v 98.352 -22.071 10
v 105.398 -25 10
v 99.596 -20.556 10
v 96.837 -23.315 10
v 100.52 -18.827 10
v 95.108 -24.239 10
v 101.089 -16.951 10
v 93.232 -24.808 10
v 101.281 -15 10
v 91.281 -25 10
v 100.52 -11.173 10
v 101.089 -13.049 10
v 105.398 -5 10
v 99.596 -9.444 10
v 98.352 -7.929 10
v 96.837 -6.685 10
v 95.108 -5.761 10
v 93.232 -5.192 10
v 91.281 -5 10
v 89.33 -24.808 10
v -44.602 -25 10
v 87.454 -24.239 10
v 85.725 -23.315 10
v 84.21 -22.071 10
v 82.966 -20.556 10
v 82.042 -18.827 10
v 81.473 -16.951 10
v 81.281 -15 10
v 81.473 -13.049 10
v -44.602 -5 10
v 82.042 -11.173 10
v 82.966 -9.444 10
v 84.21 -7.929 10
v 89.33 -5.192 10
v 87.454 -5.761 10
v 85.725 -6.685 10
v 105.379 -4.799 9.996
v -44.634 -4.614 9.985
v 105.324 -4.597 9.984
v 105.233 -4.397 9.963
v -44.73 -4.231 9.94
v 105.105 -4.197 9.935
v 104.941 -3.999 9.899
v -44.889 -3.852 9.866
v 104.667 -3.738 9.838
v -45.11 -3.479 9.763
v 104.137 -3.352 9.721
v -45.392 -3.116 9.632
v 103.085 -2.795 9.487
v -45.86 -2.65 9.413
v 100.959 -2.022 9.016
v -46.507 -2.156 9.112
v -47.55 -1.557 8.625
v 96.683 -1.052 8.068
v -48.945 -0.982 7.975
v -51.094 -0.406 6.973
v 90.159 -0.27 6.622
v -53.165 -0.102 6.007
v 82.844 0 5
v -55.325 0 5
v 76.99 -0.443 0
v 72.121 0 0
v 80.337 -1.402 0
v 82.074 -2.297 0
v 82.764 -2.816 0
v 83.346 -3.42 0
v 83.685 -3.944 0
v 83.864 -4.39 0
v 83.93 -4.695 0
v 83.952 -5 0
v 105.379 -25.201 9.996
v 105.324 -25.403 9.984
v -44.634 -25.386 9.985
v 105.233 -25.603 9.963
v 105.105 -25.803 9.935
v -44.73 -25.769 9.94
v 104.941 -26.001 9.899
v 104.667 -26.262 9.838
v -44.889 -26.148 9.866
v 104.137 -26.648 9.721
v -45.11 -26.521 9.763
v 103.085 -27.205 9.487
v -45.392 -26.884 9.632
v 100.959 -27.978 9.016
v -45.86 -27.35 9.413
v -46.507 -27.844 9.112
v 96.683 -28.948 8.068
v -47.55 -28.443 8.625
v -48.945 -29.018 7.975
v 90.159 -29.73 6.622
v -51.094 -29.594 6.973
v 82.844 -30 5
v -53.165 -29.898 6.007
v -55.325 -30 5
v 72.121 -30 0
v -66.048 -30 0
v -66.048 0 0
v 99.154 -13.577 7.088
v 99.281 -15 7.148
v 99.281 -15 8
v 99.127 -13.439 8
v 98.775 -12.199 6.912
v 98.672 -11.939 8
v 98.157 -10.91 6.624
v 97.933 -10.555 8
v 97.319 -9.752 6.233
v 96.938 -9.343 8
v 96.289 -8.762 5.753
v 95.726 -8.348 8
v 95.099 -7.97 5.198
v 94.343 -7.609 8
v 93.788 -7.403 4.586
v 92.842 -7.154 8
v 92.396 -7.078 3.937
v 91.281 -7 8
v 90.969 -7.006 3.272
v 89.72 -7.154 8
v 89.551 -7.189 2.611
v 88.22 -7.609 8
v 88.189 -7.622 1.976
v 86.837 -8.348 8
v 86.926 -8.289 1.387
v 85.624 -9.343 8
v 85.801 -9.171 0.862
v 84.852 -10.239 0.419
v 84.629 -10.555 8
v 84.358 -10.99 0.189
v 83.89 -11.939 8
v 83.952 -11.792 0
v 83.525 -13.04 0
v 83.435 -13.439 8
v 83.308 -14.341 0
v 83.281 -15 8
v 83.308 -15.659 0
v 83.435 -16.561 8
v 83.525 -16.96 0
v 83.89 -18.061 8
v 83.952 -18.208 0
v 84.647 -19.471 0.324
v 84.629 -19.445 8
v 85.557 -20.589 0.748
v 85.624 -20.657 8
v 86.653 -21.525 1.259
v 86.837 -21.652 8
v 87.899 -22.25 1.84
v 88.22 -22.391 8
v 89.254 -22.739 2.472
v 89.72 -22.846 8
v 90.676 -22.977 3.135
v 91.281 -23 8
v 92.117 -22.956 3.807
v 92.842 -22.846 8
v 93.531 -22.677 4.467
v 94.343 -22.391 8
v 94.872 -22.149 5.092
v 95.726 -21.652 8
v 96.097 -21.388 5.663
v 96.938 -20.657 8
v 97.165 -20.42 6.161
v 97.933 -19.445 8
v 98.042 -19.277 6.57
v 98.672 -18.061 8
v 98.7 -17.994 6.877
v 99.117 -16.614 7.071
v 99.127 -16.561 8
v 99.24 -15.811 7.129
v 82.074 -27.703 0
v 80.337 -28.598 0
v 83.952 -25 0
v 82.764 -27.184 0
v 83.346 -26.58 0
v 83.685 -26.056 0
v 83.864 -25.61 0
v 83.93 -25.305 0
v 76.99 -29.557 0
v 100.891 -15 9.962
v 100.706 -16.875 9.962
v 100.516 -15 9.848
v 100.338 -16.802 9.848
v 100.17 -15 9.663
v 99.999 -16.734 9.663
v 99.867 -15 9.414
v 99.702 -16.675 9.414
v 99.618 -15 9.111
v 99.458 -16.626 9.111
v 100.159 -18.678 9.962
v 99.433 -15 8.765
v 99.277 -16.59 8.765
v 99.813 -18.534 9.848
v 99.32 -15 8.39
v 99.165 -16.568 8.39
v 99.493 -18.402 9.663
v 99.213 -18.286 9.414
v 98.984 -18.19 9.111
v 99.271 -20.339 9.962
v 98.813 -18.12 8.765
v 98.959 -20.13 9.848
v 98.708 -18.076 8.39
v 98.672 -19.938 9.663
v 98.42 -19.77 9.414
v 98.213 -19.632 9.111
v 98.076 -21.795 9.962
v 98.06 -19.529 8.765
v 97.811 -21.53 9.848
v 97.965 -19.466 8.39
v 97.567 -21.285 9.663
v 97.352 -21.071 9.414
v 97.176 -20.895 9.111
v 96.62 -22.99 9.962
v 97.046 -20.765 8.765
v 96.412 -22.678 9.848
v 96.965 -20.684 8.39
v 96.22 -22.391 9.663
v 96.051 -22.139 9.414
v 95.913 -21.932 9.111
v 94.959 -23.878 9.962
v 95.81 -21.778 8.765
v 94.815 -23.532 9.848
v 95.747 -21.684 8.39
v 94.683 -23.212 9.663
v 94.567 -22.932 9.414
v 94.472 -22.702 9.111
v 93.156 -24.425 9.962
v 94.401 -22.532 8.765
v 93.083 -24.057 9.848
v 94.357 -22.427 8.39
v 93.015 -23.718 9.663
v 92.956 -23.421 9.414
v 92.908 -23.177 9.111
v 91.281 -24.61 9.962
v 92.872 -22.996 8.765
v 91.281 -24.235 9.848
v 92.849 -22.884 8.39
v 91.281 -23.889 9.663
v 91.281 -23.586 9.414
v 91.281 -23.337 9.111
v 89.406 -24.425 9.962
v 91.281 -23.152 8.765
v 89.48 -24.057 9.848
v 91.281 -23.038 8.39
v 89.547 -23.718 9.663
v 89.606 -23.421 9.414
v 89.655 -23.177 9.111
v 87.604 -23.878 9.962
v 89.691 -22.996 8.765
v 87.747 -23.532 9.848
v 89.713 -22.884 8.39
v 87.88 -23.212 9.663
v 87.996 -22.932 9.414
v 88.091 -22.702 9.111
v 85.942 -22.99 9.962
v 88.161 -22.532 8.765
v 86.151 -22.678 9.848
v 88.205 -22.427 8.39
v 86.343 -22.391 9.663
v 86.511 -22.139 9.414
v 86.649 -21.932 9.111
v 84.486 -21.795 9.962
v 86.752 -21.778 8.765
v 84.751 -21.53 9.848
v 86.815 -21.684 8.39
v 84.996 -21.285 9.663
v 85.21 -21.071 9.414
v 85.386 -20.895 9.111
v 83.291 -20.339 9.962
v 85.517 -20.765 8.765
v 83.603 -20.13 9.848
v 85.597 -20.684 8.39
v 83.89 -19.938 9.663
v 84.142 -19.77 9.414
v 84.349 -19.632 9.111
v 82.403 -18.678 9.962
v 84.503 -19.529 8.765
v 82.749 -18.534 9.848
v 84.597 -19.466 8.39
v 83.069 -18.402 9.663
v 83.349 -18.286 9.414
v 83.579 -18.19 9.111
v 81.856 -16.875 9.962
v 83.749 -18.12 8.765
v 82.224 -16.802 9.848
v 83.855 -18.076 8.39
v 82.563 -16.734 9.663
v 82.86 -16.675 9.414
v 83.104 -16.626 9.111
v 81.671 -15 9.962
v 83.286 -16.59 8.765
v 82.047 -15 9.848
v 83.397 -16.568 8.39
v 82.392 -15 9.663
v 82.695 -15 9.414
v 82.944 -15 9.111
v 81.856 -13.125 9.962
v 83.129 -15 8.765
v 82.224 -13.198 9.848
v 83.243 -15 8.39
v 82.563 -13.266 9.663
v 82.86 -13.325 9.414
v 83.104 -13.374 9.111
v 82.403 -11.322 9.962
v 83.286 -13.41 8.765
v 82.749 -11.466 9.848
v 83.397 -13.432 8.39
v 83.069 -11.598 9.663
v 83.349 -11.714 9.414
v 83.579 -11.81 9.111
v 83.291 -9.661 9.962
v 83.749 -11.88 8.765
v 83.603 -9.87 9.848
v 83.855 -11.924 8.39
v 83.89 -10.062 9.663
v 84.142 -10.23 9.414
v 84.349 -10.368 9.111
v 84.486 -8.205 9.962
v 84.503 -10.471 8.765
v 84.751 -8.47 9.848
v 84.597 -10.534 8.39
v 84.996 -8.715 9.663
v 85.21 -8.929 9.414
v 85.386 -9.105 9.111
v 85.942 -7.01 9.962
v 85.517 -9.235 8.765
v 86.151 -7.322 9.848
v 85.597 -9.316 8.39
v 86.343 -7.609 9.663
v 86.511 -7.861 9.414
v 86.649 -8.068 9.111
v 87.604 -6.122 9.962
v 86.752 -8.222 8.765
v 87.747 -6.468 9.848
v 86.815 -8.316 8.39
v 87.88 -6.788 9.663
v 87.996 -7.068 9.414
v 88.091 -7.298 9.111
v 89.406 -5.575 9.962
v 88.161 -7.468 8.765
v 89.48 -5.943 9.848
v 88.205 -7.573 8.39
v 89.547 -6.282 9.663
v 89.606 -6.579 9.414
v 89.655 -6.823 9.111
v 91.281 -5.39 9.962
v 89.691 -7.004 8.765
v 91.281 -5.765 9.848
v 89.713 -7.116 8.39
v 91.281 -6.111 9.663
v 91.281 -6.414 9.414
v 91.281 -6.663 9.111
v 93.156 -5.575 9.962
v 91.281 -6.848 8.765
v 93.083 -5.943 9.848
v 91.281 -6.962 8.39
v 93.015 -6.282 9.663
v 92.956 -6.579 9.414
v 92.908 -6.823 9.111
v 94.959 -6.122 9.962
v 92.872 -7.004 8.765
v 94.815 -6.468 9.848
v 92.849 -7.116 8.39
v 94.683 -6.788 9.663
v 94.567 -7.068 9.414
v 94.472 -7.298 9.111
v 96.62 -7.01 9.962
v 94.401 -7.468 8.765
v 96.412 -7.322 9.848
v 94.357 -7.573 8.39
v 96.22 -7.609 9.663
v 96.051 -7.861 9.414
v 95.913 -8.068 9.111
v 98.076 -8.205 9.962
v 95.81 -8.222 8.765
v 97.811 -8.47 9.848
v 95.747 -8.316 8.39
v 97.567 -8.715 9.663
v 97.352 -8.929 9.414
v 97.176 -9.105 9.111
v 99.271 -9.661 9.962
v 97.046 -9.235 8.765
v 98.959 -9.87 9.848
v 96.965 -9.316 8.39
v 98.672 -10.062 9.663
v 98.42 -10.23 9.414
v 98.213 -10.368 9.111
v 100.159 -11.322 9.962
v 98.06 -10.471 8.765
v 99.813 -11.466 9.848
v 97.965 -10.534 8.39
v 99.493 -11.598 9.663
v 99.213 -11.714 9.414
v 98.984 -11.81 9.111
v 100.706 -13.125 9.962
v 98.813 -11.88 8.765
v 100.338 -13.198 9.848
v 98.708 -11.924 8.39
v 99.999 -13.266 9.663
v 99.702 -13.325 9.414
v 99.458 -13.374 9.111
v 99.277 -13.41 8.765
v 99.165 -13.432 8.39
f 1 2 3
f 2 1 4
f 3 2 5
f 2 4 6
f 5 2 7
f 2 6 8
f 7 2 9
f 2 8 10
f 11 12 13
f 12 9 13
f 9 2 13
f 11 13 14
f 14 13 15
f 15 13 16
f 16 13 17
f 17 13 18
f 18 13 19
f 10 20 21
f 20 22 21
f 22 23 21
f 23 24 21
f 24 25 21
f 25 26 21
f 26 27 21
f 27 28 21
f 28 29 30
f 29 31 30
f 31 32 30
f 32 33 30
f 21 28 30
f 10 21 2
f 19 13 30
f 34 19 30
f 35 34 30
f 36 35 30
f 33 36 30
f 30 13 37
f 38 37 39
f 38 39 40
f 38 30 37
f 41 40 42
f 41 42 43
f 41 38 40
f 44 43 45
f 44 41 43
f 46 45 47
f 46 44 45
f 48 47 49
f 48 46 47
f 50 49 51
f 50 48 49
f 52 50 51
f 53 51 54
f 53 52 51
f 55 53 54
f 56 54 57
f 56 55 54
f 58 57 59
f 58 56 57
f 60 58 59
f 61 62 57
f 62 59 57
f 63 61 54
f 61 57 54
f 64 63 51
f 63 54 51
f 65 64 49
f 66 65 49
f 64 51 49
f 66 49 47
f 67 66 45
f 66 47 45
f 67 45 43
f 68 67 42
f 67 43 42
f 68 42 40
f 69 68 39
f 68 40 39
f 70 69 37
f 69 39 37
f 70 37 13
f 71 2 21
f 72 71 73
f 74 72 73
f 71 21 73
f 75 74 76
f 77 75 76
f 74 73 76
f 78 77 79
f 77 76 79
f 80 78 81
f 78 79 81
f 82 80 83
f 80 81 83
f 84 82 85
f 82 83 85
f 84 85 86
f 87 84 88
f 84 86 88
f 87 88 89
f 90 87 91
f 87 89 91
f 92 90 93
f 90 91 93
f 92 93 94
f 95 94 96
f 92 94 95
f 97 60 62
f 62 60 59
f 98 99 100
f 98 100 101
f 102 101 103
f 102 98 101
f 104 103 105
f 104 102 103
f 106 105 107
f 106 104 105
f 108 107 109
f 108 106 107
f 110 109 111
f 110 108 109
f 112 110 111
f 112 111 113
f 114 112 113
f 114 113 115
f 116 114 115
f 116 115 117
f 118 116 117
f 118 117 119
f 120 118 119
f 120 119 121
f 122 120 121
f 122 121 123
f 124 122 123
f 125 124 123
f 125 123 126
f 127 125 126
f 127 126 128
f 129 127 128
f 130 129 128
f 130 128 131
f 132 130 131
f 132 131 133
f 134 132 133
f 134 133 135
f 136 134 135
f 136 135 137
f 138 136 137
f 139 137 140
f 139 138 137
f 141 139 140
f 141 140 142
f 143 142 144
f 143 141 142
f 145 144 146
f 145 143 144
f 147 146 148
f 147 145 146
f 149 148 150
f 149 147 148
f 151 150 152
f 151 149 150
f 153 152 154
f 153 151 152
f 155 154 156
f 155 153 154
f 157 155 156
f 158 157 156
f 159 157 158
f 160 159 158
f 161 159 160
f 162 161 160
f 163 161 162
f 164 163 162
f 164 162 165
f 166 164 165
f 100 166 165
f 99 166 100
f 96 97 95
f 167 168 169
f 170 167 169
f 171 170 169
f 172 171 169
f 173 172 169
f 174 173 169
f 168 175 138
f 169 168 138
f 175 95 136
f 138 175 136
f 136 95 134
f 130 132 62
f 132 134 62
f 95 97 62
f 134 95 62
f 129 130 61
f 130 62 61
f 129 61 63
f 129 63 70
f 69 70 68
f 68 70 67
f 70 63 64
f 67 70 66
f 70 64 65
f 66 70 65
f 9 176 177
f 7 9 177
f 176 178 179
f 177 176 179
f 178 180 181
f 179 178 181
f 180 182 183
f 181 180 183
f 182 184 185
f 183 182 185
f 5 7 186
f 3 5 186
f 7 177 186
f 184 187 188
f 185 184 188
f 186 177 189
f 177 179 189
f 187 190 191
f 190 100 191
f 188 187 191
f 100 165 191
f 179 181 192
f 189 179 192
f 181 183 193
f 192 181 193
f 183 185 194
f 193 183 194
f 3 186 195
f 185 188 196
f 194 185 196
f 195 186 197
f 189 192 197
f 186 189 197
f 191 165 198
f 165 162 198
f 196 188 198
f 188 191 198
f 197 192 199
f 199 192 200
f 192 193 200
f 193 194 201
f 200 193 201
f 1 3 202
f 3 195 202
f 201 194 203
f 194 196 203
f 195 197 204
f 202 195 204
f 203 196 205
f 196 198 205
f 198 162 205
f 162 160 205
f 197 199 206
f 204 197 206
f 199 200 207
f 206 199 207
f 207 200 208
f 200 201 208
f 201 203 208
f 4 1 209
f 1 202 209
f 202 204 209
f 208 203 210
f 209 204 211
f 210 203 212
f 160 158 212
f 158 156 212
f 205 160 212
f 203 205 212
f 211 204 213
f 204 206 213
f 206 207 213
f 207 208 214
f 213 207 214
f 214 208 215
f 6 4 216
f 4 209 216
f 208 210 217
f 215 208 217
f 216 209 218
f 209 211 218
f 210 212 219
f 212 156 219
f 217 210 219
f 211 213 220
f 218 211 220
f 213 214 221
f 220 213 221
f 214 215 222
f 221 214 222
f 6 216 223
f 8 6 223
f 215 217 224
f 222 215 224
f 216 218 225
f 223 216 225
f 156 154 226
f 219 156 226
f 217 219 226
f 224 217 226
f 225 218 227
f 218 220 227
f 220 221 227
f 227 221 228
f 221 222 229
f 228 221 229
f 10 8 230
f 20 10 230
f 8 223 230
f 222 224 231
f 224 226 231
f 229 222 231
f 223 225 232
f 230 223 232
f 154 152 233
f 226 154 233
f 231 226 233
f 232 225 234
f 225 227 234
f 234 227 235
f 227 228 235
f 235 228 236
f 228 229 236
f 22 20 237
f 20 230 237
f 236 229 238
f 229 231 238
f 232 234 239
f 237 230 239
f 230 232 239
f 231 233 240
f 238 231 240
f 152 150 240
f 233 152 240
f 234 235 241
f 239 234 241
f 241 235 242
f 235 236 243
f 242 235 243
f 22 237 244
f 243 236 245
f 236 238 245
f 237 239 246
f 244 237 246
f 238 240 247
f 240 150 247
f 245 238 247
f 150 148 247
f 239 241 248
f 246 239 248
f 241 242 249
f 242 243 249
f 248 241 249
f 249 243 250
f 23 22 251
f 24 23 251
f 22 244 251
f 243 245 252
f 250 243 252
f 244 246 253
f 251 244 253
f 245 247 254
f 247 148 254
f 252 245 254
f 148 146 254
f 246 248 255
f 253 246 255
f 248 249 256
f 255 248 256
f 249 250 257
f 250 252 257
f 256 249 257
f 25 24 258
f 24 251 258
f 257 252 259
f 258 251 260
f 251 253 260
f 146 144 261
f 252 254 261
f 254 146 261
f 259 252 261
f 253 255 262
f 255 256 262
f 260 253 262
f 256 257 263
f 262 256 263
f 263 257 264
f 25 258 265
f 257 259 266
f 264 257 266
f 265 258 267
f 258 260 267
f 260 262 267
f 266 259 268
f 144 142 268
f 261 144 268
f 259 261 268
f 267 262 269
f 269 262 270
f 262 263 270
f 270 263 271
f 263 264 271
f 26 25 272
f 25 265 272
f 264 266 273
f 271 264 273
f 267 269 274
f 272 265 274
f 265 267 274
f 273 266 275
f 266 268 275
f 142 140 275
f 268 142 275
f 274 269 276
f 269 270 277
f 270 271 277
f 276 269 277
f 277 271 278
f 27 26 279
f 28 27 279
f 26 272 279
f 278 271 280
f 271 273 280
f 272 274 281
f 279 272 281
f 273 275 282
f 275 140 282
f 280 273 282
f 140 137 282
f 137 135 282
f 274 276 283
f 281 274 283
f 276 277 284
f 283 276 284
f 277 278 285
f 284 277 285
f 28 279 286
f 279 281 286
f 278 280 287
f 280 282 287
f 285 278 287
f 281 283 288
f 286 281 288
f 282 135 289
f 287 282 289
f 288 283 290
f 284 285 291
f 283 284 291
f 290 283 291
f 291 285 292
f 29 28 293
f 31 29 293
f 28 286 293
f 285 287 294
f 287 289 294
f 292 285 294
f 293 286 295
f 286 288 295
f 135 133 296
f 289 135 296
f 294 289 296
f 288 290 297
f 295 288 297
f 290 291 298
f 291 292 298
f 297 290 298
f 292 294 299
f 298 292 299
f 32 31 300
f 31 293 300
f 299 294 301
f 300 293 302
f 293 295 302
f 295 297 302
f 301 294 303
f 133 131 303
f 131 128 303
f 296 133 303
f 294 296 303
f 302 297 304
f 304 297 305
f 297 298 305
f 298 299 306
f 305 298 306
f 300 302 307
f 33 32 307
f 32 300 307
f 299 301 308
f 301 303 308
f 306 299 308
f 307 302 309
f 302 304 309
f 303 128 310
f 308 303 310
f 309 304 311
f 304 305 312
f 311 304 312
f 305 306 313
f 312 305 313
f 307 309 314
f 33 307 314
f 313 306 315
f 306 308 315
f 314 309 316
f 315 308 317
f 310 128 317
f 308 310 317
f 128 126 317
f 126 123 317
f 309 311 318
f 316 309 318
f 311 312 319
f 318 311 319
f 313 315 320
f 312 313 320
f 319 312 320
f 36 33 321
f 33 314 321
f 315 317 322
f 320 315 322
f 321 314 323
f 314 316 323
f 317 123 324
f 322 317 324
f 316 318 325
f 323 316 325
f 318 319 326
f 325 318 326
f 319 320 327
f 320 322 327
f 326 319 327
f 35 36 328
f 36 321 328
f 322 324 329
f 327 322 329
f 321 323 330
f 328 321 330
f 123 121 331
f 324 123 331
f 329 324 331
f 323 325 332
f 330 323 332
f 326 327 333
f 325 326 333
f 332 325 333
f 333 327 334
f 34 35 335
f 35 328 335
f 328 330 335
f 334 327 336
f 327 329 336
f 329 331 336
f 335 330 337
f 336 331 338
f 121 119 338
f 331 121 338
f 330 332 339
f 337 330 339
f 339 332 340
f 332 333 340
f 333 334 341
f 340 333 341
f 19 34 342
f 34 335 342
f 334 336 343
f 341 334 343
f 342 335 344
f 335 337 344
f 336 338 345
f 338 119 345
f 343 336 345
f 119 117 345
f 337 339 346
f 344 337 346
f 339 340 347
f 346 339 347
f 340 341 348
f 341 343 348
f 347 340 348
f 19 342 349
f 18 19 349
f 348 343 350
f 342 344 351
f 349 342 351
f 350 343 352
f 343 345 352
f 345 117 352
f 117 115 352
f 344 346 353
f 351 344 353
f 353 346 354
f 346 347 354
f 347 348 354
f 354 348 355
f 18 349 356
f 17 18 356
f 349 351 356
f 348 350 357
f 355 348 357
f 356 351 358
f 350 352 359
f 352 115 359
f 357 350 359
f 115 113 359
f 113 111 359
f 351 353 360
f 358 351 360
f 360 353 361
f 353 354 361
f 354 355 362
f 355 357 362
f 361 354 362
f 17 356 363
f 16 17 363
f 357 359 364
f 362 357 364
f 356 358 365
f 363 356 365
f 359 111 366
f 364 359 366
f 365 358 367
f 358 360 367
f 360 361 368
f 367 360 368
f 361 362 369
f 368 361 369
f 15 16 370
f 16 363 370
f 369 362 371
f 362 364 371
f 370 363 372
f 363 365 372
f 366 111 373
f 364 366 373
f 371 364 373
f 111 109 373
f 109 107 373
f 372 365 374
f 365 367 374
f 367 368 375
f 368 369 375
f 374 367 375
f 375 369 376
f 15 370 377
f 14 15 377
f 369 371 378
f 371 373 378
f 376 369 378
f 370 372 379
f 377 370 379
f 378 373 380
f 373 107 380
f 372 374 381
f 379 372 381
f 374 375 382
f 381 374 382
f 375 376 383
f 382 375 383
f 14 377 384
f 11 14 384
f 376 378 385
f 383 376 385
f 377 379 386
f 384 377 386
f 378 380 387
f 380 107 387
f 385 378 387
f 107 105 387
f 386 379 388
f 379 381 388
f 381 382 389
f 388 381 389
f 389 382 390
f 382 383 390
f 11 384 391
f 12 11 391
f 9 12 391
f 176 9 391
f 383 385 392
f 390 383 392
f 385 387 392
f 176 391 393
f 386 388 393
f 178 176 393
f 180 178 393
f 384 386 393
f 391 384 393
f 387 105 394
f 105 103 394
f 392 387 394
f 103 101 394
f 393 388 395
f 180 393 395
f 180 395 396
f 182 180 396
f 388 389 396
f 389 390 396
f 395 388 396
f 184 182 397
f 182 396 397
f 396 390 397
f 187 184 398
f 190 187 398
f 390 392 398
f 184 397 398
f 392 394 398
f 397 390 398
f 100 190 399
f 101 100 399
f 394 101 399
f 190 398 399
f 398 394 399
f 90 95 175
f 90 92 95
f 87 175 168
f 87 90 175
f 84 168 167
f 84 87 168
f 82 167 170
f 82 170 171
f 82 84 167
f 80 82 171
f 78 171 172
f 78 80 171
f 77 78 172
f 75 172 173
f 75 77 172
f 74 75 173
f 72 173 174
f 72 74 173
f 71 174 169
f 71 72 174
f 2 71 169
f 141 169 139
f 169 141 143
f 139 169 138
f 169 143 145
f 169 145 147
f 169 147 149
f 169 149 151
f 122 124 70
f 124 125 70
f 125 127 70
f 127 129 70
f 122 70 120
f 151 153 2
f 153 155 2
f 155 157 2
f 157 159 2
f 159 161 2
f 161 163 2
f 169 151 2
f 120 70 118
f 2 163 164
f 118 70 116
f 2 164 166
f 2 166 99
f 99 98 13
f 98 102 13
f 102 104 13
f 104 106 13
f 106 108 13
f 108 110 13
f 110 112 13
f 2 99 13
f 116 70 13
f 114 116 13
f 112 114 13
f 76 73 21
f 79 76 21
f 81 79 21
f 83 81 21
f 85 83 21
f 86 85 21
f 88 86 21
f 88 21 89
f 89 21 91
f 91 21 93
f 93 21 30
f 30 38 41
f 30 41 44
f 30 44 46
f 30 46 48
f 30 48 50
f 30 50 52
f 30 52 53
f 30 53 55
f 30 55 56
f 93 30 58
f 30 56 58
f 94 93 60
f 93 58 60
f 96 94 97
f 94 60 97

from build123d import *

# Parameters (mm, degrees)
F1_DEPTH = 30
F2_R     = 8
F3_DEPTH = 25
F4_R     = 5
F5_R     = 1.99999


# Not quite as in the source:
# - a fillet or chamfer is up to 0.001 mm smaller than in the source, because OpenCascade refuses the exact size


with BuildPart() as f1:
    # F0 (on Front) → F1 (new body)
    with BuildSketch(Plane.XZ):
        Polygon((-44.6024514475, 10), (-66.0475206525, 0), (83.9524793475, 0), (105.3975485525, 10), align=None)
    extrude(amount=F1_DEPTH)

    # F2 (on Top) → F3 (cut)
    with BuildSketch(Plane.XY):
        with Locations((91.2811756134, -15)):
            Circle(F2_R)
    extrude(amount=F3_DEPTH, mode=Mode.SUBTRACT)

    # F4
    f4_edges = [f1.edges().sort_by_distance(p)[0] for p in [
        (30.397549, 0, 10),
        (30.397549, -30, 10),
        (94.675014, -30, 5),
        (94.675014, 0, 5),
    ]]
    fillet(f4_edges, radius=F4_R)

    # F5 (radius 2 in the source; OpenCascade refuses exactly that, so slightly less here)
    f5_edges = [f1.edges().sort_by_distance(p)[0] for p in [
        (83.281176, -15, 10),
    ]]
    fillet(f5_edges, radius=F5_R)


solid = f1.part
